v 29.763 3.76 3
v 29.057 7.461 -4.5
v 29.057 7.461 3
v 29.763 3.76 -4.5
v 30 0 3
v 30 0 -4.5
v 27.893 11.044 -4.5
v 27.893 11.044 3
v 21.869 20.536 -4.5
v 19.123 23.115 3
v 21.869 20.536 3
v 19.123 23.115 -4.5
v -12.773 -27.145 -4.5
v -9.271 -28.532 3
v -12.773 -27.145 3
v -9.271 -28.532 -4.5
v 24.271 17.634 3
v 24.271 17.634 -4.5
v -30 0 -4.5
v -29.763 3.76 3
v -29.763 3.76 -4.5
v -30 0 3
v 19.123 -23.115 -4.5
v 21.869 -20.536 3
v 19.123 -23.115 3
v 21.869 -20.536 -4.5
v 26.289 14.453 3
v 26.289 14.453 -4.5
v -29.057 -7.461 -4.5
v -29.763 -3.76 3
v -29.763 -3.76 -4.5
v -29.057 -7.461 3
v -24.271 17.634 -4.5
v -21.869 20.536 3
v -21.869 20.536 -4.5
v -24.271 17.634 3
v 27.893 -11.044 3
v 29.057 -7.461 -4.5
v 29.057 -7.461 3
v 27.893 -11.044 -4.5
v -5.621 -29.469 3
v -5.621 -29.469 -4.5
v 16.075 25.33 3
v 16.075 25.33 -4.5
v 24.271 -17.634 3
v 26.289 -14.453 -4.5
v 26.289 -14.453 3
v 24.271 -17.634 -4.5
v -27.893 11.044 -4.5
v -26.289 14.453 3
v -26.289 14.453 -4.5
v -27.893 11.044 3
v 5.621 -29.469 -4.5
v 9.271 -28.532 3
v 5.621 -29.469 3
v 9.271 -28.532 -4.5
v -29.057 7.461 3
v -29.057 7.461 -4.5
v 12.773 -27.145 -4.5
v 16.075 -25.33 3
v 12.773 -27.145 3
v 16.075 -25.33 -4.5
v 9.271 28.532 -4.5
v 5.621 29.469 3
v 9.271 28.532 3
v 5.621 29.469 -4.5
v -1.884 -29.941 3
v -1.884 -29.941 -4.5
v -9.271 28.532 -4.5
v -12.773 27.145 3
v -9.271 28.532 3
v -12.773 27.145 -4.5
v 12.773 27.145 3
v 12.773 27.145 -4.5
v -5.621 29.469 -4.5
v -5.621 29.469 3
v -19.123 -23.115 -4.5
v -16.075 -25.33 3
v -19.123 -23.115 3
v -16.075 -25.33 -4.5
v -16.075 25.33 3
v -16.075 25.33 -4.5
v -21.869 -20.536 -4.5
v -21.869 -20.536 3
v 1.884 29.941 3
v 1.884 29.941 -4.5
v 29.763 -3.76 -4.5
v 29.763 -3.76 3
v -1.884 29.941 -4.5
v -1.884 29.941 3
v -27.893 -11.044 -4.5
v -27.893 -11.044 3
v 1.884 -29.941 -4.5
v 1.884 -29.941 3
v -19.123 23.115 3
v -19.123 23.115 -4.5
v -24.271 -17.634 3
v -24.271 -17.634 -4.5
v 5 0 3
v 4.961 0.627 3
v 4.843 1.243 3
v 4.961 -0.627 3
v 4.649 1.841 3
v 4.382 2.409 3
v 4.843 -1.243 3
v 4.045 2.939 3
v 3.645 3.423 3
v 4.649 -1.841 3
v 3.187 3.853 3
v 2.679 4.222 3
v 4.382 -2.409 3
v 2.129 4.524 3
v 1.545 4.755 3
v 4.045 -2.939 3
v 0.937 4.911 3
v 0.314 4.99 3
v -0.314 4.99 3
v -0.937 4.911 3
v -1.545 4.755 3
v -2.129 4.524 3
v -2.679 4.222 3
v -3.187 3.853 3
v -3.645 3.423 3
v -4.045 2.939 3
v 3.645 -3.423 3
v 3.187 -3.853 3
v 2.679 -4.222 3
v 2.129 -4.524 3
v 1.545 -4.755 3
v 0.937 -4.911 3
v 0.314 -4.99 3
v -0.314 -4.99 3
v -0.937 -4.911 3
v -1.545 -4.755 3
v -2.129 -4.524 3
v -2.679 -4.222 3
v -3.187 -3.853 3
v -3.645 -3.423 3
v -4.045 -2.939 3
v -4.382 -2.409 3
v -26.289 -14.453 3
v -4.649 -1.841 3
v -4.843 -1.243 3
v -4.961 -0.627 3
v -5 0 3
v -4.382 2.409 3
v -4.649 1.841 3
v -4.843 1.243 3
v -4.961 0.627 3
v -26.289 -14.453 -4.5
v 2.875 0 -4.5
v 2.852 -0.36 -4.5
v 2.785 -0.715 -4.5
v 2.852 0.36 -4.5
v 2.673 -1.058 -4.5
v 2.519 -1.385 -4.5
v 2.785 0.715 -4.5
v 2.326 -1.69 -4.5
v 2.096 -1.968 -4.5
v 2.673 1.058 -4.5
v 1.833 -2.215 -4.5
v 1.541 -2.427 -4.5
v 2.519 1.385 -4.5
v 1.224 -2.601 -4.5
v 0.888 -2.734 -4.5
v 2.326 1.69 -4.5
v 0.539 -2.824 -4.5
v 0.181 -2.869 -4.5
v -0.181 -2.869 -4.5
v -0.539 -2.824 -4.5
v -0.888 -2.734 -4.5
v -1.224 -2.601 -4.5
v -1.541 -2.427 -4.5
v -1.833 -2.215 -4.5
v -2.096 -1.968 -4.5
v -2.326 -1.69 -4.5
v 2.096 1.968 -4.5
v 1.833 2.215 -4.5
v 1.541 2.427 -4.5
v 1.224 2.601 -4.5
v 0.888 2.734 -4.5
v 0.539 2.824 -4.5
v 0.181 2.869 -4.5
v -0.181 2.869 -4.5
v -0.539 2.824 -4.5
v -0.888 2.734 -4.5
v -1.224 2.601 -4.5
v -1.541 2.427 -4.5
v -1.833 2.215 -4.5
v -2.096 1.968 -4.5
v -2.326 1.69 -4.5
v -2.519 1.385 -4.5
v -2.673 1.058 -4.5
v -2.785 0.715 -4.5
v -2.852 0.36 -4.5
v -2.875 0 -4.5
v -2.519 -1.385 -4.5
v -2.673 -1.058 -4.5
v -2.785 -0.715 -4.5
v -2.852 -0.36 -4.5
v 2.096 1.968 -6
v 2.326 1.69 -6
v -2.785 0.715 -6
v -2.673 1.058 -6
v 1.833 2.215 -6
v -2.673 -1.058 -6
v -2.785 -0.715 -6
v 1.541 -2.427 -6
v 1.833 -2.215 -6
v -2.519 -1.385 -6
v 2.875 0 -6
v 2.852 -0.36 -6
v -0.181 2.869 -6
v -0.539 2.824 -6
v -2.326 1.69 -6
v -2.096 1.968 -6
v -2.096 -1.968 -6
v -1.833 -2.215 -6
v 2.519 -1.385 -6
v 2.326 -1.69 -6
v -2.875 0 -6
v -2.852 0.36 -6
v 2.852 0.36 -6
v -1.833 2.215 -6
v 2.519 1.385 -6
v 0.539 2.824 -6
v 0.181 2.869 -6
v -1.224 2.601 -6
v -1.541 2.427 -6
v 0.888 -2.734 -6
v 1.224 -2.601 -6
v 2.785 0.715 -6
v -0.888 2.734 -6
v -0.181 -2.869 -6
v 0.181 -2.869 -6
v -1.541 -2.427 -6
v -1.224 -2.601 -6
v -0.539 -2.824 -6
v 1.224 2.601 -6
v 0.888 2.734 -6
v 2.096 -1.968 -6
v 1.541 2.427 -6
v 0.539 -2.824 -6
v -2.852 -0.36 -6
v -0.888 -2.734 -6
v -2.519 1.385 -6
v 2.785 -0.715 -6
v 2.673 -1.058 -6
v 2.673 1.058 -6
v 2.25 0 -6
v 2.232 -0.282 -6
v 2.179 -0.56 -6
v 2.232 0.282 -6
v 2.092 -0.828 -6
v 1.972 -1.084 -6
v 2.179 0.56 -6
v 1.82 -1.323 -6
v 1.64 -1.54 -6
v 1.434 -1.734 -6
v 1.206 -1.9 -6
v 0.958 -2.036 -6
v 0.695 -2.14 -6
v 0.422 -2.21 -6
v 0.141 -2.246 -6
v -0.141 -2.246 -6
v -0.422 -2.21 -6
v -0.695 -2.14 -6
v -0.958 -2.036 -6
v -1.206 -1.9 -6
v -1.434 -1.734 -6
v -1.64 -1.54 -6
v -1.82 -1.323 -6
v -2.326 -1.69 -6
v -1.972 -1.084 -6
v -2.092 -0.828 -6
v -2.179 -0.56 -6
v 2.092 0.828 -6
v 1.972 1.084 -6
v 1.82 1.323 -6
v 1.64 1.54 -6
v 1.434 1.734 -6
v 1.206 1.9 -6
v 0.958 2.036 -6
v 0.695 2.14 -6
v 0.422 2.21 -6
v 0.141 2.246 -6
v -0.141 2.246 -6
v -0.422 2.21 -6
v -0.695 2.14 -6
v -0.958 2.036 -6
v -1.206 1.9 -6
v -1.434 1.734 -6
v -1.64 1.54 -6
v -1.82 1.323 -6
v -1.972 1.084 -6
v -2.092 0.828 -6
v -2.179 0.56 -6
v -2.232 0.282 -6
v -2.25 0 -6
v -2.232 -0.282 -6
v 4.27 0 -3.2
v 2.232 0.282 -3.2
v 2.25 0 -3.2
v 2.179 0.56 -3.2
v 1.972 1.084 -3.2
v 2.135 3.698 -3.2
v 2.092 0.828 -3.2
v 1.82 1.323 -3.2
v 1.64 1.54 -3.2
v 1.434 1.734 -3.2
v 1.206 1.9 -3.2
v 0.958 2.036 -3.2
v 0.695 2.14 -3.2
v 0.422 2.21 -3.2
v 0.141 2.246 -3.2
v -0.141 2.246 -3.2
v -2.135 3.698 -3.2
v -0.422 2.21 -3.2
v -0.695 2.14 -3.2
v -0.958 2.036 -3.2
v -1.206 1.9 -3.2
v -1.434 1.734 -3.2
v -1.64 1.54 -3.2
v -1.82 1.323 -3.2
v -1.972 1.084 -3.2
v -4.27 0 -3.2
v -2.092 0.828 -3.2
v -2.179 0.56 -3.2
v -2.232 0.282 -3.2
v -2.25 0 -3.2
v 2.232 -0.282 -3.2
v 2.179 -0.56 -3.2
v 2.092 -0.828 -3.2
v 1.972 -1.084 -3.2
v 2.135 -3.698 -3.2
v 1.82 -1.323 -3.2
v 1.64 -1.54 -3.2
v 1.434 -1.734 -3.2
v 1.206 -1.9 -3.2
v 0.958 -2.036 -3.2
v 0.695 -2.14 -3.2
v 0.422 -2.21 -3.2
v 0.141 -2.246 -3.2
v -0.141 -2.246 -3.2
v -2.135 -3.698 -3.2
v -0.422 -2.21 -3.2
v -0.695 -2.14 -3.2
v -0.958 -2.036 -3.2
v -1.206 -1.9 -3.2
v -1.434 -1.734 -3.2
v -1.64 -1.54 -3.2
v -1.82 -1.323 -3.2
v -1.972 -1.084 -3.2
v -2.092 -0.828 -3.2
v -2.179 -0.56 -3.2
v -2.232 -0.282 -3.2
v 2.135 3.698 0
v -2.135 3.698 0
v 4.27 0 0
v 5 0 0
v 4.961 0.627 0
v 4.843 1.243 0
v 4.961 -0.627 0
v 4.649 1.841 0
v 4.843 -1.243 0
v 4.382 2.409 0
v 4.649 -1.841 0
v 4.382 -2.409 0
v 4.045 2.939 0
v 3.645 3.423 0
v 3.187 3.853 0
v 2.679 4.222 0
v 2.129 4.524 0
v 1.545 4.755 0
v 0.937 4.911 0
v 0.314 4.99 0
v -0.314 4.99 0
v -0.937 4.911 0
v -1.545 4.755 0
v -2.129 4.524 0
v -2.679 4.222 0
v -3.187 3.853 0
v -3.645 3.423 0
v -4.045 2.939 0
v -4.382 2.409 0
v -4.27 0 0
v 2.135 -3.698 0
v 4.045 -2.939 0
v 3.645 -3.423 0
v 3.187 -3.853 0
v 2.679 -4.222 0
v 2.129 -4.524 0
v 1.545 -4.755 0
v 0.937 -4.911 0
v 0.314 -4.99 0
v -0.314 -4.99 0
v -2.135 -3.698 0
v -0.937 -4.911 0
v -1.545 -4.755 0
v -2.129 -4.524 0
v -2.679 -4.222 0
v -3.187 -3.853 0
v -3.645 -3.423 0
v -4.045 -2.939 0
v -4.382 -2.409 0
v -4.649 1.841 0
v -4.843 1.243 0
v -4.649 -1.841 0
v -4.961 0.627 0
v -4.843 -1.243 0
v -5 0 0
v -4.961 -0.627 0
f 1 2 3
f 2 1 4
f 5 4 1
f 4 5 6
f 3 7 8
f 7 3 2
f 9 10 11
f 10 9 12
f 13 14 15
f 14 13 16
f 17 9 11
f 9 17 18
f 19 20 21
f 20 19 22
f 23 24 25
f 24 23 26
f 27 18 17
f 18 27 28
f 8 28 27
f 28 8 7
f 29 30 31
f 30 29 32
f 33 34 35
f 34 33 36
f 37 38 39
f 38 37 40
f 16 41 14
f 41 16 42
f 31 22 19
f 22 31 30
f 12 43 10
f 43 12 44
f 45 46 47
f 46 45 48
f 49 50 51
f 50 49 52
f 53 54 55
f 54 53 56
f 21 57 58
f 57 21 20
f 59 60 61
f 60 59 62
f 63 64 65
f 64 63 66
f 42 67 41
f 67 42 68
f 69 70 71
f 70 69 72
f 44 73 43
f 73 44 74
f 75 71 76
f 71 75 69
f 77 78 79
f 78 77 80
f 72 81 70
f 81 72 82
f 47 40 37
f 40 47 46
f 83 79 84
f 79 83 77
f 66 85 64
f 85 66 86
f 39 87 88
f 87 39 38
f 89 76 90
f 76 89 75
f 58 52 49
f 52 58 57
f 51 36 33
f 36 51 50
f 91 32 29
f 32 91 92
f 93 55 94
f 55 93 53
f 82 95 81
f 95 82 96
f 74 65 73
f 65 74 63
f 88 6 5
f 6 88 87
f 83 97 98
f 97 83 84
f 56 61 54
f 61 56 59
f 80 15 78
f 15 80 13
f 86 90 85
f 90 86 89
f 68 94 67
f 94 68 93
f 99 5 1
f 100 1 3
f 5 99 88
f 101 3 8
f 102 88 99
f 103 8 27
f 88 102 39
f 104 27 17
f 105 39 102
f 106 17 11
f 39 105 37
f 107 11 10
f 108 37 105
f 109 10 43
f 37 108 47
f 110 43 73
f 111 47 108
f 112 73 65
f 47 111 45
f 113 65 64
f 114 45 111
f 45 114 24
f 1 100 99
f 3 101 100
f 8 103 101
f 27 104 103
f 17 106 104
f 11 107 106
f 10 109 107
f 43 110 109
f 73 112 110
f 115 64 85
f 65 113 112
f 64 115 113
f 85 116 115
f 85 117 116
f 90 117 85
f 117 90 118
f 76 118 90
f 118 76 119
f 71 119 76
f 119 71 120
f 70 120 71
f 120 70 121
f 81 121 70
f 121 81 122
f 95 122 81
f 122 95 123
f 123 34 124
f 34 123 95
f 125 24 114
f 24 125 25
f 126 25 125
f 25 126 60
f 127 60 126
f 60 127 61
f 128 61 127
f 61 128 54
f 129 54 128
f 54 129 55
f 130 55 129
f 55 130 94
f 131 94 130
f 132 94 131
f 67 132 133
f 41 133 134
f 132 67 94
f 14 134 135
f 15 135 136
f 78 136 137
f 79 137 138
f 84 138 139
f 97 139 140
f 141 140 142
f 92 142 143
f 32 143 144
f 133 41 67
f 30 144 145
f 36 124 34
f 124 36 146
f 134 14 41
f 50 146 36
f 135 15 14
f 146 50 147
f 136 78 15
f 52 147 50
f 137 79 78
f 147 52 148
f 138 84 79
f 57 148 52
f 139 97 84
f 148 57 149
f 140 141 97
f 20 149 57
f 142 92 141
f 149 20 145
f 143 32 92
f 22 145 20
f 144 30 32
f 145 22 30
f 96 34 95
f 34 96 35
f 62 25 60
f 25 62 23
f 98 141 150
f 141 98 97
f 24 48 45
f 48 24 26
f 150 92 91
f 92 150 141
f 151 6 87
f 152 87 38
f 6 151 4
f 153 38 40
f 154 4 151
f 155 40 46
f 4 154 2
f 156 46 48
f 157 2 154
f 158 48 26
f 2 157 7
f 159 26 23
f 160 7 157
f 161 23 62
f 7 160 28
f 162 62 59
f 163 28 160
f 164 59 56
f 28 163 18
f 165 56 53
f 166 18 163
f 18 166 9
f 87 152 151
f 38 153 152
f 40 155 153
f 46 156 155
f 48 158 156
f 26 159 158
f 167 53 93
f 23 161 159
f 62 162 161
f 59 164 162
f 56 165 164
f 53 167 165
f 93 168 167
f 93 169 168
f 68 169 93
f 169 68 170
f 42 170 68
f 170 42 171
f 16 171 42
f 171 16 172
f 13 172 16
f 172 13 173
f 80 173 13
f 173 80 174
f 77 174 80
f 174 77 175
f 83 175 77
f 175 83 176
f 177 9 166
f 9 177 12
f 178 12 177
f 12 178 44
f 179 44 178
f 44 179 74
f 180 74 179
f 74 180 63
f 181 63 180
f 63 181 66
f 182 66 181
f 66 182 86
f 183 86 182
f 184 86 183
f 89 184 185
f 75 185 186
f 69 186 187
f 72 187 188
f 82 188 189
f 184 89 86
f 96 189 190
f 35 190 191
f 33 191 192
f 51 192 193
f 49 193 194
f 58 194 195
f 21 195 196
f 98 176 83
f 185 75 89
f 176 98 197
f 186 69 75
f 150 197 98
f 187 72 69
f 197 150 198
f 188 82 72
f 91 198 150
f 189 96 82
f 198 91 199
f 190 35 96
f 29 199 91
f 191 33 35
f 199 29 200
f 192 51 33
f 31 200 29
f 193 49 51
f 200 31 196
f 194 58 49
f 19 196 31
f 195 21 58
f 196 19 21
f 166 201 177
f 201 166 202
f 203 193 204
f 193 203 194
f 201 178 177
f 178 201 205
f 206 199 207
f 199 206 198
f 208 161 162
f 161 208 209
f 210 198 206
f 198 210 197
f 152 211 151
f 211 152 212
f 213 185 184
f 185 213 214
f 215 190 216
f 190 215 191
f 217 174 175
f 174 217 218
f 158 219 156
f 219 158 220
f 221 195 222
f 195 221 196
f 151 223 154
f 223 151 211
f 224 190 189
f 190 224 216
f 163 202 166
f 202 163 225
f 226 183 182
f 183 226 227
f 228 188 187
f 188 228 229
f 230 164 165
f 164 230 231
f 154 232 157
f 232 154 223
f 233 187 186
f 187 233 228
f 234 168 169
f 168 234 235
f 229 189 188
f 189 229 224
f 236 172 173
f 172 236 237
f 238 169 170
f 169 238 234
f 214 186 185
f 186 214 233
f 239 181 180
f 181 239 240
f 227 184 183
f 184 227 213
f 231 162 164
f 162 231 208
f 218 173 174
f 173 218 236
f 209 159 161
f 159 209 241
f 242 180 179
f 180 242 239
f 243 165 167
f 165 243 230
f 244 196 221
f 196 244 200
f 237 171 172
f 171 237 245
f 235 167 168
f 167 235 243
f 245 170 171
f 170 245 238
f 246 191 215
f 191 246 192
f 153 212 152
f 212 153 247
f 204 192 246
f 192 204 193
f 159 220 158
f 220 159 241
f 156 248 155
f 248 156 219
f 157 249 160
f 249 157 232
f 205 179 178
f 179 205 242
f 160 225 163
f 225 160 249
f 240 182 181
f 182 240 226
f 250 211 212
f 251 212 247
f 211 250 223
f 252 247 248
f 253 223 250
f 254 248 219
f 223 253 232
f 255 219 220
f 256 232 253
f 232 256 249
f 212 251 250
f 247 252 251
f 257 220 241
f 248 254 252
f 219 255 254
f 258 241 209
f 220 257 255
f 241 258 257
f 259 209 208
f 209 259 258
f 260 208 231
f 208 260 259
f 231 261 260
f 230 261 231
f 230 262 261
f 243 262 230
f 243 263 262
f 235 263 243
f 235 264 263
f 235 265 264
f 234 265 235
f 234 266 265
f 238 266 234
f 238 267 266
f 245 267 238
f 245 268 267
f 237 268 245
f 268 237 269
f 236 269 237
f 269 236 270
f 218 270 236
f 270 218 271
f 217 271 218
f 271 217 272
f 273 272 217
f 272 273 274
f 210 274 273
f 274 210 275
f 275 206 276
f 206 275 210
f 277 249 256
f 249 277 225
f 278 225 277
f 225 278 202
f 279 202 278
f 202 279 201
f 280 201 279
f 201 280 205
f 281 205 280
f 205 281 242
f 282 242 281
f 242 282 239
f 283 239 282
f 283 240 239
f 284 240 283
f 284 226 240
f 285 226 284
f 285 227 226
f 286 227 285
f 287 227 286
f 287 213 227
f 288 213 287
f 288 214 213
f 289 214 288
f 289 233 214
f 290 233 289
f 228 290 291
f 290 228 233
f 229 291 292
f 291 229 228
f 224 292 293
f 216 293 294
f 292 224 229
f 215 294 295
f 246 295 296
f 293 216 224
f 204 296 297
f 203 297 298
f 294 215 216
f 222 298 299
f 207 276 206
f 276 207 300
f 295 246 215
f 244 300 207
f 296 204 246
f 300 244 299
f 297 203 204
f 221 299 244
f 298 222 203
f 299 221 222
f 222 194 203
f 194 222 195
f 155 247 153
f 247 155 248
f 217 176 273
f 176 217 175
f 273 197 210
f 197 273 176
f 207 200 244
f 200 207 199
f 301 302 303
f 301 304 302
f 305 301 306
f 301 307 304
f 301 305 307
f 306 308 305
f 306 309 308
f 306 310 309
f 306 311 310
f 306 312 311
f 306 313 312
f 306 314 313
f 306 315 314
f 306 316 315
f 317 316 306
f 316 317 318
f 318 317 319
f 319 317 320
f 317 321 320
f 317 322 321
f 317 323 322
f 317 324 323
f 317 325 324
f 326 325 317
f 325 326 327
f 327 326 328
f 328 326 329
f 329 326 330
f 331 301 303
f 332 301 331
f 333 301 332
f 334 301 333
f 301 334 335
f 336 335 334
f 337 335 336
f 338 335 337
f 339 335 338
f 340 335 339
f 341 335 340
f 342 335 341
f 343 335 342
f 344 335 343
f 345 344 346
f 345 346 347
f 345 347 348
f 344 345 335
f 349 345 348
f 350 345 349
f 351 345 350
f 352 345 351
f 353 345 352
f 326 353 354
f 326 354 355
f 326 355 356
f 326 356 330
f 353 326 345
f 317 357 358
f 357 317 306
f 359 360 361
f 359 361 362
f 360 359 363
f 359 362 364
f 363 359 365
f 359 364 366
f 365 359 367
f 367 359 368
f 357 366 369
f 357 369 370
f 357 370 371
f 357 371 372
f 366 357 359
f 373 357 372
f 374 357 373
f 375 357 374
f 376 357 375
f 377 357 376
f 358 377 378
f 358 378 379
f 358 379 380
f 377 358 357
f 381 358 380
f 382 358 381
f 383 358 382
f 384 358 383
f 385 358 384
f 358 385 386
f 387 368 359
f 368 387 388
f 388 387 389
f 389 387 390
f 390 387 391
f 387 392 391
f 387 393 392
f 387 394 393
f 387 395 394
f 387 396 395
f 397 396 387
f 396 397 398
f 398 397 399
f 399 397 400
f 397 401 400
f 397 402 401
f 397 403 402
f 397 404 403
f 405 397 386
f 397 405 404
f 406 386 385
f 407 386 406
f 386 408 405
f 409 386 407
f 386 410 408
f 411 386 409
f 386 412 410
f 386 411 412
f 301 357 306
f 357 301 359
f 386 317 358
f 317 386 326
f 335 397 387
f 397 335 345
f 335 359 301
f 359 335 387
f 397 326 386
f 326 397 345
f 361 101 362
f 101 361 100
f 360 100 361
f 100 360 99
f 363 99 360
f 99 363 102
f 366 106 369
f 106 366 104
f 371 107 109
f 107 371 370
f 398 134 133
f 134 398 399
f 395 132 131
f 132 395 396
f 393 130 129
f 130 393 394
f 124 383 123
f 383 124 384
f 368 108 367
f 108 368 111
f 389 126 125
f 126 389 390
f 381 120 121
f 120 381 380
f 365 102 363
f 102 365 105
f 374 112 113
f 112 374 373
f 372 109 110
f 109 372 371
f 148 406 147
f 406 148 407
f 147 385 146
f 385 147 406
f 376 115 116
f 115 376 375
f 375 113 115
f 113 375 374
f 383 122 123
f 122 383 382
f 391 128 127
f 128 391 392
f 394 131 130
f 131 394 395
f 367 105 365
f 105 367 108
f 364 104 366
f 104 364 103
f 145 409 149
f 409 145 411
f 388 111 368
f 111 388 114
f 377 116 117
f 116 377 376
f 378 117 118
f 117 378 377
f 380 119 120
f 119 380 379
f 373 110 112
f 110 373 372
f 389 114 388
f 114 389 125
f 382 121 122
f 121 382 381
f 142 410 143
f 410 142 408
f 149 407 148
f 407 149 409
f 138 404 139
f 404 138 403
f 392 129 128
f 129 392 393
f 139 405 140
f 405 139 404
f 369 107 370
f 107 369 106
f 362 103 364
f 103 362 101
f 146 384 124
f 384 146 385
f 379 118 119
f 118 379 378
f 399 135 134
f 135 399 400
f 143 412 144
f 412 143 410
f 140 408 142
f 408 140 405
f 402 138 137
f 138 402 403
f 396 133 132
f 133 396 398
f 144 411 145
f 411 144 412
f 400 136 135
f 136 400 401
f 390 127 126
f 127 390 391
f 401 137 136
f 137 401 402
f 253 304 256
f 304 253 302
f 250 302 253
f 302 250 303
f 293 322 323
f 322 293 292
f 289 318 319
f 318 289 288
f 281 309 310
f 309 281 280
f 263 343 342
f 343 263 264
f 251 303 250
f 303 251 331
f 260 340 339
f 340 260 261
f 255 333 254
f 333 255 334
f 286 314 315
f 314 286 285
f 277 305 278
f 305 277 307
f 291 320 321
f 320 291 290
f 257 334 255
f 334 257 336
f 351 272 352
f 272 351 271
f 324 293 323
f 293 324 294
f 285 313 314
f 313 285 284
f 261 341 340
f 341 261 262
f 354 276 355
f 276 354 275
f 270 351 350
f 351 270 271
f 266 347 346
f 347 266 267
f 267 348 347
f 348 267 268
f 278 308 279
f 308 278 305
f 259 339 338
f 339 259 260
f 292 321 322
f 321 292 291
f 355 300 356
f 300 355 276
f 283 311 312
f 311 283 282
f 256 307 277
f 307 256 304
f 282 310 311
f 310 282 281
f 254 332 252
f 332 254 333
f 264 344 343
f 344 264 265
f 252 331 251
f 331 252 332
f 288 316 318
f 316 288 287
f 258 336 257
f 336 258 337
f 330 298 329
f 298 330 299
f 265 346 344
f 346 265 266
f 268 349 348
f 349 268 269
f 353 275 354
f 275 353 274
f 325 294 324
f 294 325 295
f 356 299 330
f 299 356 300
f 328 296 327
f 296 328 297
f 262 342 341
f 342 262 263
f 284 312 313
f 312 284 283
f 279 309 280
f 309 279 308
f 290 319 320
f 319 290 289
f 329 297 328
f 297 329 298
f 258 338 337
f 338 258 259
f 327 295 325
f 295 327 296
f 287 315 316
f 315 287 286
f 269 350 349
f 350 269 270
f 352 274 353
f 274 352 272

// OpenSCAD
$fn = 50;


difference() {
	union() {
		translate(v = [0, 0, -4.5000000000]) {
			cylinder(h = 7.5000000000, r = 30.0000000000);
		}
		#translate(v = [0, 0, -6.0000000000]) {
			cylinder(h = 6, r = 2.8750000000);
		}
	}
	union() {
		translate(v = [0, 0, 0]) {
			rotate(a = [0, 0, 0]) {
				difference() {
					union() {
						translate(v = [0, 0, -3.2000000000]) {
							linear_extrude(height = 3.2000000000) {
								polygon(points = [[4.2698000000, 0.0000000000], [2.1349000000, 3.6977552691], [-2.1349000000, 3.6977552691], [-4.2698000000, 0.0000000000], [-2.1349000000, -3.6977552691], [2.1349000000, -3.6977552691]]);
							}
						}
					}
					union();
				}
			}
		}
		#cylinder(h = 3, r = 5.0000000000);
		#translate(v = [0, 0, -100.0000000000]) {
			cylinder(h = 200, r = 2.2500000000);
		}
	}
}
